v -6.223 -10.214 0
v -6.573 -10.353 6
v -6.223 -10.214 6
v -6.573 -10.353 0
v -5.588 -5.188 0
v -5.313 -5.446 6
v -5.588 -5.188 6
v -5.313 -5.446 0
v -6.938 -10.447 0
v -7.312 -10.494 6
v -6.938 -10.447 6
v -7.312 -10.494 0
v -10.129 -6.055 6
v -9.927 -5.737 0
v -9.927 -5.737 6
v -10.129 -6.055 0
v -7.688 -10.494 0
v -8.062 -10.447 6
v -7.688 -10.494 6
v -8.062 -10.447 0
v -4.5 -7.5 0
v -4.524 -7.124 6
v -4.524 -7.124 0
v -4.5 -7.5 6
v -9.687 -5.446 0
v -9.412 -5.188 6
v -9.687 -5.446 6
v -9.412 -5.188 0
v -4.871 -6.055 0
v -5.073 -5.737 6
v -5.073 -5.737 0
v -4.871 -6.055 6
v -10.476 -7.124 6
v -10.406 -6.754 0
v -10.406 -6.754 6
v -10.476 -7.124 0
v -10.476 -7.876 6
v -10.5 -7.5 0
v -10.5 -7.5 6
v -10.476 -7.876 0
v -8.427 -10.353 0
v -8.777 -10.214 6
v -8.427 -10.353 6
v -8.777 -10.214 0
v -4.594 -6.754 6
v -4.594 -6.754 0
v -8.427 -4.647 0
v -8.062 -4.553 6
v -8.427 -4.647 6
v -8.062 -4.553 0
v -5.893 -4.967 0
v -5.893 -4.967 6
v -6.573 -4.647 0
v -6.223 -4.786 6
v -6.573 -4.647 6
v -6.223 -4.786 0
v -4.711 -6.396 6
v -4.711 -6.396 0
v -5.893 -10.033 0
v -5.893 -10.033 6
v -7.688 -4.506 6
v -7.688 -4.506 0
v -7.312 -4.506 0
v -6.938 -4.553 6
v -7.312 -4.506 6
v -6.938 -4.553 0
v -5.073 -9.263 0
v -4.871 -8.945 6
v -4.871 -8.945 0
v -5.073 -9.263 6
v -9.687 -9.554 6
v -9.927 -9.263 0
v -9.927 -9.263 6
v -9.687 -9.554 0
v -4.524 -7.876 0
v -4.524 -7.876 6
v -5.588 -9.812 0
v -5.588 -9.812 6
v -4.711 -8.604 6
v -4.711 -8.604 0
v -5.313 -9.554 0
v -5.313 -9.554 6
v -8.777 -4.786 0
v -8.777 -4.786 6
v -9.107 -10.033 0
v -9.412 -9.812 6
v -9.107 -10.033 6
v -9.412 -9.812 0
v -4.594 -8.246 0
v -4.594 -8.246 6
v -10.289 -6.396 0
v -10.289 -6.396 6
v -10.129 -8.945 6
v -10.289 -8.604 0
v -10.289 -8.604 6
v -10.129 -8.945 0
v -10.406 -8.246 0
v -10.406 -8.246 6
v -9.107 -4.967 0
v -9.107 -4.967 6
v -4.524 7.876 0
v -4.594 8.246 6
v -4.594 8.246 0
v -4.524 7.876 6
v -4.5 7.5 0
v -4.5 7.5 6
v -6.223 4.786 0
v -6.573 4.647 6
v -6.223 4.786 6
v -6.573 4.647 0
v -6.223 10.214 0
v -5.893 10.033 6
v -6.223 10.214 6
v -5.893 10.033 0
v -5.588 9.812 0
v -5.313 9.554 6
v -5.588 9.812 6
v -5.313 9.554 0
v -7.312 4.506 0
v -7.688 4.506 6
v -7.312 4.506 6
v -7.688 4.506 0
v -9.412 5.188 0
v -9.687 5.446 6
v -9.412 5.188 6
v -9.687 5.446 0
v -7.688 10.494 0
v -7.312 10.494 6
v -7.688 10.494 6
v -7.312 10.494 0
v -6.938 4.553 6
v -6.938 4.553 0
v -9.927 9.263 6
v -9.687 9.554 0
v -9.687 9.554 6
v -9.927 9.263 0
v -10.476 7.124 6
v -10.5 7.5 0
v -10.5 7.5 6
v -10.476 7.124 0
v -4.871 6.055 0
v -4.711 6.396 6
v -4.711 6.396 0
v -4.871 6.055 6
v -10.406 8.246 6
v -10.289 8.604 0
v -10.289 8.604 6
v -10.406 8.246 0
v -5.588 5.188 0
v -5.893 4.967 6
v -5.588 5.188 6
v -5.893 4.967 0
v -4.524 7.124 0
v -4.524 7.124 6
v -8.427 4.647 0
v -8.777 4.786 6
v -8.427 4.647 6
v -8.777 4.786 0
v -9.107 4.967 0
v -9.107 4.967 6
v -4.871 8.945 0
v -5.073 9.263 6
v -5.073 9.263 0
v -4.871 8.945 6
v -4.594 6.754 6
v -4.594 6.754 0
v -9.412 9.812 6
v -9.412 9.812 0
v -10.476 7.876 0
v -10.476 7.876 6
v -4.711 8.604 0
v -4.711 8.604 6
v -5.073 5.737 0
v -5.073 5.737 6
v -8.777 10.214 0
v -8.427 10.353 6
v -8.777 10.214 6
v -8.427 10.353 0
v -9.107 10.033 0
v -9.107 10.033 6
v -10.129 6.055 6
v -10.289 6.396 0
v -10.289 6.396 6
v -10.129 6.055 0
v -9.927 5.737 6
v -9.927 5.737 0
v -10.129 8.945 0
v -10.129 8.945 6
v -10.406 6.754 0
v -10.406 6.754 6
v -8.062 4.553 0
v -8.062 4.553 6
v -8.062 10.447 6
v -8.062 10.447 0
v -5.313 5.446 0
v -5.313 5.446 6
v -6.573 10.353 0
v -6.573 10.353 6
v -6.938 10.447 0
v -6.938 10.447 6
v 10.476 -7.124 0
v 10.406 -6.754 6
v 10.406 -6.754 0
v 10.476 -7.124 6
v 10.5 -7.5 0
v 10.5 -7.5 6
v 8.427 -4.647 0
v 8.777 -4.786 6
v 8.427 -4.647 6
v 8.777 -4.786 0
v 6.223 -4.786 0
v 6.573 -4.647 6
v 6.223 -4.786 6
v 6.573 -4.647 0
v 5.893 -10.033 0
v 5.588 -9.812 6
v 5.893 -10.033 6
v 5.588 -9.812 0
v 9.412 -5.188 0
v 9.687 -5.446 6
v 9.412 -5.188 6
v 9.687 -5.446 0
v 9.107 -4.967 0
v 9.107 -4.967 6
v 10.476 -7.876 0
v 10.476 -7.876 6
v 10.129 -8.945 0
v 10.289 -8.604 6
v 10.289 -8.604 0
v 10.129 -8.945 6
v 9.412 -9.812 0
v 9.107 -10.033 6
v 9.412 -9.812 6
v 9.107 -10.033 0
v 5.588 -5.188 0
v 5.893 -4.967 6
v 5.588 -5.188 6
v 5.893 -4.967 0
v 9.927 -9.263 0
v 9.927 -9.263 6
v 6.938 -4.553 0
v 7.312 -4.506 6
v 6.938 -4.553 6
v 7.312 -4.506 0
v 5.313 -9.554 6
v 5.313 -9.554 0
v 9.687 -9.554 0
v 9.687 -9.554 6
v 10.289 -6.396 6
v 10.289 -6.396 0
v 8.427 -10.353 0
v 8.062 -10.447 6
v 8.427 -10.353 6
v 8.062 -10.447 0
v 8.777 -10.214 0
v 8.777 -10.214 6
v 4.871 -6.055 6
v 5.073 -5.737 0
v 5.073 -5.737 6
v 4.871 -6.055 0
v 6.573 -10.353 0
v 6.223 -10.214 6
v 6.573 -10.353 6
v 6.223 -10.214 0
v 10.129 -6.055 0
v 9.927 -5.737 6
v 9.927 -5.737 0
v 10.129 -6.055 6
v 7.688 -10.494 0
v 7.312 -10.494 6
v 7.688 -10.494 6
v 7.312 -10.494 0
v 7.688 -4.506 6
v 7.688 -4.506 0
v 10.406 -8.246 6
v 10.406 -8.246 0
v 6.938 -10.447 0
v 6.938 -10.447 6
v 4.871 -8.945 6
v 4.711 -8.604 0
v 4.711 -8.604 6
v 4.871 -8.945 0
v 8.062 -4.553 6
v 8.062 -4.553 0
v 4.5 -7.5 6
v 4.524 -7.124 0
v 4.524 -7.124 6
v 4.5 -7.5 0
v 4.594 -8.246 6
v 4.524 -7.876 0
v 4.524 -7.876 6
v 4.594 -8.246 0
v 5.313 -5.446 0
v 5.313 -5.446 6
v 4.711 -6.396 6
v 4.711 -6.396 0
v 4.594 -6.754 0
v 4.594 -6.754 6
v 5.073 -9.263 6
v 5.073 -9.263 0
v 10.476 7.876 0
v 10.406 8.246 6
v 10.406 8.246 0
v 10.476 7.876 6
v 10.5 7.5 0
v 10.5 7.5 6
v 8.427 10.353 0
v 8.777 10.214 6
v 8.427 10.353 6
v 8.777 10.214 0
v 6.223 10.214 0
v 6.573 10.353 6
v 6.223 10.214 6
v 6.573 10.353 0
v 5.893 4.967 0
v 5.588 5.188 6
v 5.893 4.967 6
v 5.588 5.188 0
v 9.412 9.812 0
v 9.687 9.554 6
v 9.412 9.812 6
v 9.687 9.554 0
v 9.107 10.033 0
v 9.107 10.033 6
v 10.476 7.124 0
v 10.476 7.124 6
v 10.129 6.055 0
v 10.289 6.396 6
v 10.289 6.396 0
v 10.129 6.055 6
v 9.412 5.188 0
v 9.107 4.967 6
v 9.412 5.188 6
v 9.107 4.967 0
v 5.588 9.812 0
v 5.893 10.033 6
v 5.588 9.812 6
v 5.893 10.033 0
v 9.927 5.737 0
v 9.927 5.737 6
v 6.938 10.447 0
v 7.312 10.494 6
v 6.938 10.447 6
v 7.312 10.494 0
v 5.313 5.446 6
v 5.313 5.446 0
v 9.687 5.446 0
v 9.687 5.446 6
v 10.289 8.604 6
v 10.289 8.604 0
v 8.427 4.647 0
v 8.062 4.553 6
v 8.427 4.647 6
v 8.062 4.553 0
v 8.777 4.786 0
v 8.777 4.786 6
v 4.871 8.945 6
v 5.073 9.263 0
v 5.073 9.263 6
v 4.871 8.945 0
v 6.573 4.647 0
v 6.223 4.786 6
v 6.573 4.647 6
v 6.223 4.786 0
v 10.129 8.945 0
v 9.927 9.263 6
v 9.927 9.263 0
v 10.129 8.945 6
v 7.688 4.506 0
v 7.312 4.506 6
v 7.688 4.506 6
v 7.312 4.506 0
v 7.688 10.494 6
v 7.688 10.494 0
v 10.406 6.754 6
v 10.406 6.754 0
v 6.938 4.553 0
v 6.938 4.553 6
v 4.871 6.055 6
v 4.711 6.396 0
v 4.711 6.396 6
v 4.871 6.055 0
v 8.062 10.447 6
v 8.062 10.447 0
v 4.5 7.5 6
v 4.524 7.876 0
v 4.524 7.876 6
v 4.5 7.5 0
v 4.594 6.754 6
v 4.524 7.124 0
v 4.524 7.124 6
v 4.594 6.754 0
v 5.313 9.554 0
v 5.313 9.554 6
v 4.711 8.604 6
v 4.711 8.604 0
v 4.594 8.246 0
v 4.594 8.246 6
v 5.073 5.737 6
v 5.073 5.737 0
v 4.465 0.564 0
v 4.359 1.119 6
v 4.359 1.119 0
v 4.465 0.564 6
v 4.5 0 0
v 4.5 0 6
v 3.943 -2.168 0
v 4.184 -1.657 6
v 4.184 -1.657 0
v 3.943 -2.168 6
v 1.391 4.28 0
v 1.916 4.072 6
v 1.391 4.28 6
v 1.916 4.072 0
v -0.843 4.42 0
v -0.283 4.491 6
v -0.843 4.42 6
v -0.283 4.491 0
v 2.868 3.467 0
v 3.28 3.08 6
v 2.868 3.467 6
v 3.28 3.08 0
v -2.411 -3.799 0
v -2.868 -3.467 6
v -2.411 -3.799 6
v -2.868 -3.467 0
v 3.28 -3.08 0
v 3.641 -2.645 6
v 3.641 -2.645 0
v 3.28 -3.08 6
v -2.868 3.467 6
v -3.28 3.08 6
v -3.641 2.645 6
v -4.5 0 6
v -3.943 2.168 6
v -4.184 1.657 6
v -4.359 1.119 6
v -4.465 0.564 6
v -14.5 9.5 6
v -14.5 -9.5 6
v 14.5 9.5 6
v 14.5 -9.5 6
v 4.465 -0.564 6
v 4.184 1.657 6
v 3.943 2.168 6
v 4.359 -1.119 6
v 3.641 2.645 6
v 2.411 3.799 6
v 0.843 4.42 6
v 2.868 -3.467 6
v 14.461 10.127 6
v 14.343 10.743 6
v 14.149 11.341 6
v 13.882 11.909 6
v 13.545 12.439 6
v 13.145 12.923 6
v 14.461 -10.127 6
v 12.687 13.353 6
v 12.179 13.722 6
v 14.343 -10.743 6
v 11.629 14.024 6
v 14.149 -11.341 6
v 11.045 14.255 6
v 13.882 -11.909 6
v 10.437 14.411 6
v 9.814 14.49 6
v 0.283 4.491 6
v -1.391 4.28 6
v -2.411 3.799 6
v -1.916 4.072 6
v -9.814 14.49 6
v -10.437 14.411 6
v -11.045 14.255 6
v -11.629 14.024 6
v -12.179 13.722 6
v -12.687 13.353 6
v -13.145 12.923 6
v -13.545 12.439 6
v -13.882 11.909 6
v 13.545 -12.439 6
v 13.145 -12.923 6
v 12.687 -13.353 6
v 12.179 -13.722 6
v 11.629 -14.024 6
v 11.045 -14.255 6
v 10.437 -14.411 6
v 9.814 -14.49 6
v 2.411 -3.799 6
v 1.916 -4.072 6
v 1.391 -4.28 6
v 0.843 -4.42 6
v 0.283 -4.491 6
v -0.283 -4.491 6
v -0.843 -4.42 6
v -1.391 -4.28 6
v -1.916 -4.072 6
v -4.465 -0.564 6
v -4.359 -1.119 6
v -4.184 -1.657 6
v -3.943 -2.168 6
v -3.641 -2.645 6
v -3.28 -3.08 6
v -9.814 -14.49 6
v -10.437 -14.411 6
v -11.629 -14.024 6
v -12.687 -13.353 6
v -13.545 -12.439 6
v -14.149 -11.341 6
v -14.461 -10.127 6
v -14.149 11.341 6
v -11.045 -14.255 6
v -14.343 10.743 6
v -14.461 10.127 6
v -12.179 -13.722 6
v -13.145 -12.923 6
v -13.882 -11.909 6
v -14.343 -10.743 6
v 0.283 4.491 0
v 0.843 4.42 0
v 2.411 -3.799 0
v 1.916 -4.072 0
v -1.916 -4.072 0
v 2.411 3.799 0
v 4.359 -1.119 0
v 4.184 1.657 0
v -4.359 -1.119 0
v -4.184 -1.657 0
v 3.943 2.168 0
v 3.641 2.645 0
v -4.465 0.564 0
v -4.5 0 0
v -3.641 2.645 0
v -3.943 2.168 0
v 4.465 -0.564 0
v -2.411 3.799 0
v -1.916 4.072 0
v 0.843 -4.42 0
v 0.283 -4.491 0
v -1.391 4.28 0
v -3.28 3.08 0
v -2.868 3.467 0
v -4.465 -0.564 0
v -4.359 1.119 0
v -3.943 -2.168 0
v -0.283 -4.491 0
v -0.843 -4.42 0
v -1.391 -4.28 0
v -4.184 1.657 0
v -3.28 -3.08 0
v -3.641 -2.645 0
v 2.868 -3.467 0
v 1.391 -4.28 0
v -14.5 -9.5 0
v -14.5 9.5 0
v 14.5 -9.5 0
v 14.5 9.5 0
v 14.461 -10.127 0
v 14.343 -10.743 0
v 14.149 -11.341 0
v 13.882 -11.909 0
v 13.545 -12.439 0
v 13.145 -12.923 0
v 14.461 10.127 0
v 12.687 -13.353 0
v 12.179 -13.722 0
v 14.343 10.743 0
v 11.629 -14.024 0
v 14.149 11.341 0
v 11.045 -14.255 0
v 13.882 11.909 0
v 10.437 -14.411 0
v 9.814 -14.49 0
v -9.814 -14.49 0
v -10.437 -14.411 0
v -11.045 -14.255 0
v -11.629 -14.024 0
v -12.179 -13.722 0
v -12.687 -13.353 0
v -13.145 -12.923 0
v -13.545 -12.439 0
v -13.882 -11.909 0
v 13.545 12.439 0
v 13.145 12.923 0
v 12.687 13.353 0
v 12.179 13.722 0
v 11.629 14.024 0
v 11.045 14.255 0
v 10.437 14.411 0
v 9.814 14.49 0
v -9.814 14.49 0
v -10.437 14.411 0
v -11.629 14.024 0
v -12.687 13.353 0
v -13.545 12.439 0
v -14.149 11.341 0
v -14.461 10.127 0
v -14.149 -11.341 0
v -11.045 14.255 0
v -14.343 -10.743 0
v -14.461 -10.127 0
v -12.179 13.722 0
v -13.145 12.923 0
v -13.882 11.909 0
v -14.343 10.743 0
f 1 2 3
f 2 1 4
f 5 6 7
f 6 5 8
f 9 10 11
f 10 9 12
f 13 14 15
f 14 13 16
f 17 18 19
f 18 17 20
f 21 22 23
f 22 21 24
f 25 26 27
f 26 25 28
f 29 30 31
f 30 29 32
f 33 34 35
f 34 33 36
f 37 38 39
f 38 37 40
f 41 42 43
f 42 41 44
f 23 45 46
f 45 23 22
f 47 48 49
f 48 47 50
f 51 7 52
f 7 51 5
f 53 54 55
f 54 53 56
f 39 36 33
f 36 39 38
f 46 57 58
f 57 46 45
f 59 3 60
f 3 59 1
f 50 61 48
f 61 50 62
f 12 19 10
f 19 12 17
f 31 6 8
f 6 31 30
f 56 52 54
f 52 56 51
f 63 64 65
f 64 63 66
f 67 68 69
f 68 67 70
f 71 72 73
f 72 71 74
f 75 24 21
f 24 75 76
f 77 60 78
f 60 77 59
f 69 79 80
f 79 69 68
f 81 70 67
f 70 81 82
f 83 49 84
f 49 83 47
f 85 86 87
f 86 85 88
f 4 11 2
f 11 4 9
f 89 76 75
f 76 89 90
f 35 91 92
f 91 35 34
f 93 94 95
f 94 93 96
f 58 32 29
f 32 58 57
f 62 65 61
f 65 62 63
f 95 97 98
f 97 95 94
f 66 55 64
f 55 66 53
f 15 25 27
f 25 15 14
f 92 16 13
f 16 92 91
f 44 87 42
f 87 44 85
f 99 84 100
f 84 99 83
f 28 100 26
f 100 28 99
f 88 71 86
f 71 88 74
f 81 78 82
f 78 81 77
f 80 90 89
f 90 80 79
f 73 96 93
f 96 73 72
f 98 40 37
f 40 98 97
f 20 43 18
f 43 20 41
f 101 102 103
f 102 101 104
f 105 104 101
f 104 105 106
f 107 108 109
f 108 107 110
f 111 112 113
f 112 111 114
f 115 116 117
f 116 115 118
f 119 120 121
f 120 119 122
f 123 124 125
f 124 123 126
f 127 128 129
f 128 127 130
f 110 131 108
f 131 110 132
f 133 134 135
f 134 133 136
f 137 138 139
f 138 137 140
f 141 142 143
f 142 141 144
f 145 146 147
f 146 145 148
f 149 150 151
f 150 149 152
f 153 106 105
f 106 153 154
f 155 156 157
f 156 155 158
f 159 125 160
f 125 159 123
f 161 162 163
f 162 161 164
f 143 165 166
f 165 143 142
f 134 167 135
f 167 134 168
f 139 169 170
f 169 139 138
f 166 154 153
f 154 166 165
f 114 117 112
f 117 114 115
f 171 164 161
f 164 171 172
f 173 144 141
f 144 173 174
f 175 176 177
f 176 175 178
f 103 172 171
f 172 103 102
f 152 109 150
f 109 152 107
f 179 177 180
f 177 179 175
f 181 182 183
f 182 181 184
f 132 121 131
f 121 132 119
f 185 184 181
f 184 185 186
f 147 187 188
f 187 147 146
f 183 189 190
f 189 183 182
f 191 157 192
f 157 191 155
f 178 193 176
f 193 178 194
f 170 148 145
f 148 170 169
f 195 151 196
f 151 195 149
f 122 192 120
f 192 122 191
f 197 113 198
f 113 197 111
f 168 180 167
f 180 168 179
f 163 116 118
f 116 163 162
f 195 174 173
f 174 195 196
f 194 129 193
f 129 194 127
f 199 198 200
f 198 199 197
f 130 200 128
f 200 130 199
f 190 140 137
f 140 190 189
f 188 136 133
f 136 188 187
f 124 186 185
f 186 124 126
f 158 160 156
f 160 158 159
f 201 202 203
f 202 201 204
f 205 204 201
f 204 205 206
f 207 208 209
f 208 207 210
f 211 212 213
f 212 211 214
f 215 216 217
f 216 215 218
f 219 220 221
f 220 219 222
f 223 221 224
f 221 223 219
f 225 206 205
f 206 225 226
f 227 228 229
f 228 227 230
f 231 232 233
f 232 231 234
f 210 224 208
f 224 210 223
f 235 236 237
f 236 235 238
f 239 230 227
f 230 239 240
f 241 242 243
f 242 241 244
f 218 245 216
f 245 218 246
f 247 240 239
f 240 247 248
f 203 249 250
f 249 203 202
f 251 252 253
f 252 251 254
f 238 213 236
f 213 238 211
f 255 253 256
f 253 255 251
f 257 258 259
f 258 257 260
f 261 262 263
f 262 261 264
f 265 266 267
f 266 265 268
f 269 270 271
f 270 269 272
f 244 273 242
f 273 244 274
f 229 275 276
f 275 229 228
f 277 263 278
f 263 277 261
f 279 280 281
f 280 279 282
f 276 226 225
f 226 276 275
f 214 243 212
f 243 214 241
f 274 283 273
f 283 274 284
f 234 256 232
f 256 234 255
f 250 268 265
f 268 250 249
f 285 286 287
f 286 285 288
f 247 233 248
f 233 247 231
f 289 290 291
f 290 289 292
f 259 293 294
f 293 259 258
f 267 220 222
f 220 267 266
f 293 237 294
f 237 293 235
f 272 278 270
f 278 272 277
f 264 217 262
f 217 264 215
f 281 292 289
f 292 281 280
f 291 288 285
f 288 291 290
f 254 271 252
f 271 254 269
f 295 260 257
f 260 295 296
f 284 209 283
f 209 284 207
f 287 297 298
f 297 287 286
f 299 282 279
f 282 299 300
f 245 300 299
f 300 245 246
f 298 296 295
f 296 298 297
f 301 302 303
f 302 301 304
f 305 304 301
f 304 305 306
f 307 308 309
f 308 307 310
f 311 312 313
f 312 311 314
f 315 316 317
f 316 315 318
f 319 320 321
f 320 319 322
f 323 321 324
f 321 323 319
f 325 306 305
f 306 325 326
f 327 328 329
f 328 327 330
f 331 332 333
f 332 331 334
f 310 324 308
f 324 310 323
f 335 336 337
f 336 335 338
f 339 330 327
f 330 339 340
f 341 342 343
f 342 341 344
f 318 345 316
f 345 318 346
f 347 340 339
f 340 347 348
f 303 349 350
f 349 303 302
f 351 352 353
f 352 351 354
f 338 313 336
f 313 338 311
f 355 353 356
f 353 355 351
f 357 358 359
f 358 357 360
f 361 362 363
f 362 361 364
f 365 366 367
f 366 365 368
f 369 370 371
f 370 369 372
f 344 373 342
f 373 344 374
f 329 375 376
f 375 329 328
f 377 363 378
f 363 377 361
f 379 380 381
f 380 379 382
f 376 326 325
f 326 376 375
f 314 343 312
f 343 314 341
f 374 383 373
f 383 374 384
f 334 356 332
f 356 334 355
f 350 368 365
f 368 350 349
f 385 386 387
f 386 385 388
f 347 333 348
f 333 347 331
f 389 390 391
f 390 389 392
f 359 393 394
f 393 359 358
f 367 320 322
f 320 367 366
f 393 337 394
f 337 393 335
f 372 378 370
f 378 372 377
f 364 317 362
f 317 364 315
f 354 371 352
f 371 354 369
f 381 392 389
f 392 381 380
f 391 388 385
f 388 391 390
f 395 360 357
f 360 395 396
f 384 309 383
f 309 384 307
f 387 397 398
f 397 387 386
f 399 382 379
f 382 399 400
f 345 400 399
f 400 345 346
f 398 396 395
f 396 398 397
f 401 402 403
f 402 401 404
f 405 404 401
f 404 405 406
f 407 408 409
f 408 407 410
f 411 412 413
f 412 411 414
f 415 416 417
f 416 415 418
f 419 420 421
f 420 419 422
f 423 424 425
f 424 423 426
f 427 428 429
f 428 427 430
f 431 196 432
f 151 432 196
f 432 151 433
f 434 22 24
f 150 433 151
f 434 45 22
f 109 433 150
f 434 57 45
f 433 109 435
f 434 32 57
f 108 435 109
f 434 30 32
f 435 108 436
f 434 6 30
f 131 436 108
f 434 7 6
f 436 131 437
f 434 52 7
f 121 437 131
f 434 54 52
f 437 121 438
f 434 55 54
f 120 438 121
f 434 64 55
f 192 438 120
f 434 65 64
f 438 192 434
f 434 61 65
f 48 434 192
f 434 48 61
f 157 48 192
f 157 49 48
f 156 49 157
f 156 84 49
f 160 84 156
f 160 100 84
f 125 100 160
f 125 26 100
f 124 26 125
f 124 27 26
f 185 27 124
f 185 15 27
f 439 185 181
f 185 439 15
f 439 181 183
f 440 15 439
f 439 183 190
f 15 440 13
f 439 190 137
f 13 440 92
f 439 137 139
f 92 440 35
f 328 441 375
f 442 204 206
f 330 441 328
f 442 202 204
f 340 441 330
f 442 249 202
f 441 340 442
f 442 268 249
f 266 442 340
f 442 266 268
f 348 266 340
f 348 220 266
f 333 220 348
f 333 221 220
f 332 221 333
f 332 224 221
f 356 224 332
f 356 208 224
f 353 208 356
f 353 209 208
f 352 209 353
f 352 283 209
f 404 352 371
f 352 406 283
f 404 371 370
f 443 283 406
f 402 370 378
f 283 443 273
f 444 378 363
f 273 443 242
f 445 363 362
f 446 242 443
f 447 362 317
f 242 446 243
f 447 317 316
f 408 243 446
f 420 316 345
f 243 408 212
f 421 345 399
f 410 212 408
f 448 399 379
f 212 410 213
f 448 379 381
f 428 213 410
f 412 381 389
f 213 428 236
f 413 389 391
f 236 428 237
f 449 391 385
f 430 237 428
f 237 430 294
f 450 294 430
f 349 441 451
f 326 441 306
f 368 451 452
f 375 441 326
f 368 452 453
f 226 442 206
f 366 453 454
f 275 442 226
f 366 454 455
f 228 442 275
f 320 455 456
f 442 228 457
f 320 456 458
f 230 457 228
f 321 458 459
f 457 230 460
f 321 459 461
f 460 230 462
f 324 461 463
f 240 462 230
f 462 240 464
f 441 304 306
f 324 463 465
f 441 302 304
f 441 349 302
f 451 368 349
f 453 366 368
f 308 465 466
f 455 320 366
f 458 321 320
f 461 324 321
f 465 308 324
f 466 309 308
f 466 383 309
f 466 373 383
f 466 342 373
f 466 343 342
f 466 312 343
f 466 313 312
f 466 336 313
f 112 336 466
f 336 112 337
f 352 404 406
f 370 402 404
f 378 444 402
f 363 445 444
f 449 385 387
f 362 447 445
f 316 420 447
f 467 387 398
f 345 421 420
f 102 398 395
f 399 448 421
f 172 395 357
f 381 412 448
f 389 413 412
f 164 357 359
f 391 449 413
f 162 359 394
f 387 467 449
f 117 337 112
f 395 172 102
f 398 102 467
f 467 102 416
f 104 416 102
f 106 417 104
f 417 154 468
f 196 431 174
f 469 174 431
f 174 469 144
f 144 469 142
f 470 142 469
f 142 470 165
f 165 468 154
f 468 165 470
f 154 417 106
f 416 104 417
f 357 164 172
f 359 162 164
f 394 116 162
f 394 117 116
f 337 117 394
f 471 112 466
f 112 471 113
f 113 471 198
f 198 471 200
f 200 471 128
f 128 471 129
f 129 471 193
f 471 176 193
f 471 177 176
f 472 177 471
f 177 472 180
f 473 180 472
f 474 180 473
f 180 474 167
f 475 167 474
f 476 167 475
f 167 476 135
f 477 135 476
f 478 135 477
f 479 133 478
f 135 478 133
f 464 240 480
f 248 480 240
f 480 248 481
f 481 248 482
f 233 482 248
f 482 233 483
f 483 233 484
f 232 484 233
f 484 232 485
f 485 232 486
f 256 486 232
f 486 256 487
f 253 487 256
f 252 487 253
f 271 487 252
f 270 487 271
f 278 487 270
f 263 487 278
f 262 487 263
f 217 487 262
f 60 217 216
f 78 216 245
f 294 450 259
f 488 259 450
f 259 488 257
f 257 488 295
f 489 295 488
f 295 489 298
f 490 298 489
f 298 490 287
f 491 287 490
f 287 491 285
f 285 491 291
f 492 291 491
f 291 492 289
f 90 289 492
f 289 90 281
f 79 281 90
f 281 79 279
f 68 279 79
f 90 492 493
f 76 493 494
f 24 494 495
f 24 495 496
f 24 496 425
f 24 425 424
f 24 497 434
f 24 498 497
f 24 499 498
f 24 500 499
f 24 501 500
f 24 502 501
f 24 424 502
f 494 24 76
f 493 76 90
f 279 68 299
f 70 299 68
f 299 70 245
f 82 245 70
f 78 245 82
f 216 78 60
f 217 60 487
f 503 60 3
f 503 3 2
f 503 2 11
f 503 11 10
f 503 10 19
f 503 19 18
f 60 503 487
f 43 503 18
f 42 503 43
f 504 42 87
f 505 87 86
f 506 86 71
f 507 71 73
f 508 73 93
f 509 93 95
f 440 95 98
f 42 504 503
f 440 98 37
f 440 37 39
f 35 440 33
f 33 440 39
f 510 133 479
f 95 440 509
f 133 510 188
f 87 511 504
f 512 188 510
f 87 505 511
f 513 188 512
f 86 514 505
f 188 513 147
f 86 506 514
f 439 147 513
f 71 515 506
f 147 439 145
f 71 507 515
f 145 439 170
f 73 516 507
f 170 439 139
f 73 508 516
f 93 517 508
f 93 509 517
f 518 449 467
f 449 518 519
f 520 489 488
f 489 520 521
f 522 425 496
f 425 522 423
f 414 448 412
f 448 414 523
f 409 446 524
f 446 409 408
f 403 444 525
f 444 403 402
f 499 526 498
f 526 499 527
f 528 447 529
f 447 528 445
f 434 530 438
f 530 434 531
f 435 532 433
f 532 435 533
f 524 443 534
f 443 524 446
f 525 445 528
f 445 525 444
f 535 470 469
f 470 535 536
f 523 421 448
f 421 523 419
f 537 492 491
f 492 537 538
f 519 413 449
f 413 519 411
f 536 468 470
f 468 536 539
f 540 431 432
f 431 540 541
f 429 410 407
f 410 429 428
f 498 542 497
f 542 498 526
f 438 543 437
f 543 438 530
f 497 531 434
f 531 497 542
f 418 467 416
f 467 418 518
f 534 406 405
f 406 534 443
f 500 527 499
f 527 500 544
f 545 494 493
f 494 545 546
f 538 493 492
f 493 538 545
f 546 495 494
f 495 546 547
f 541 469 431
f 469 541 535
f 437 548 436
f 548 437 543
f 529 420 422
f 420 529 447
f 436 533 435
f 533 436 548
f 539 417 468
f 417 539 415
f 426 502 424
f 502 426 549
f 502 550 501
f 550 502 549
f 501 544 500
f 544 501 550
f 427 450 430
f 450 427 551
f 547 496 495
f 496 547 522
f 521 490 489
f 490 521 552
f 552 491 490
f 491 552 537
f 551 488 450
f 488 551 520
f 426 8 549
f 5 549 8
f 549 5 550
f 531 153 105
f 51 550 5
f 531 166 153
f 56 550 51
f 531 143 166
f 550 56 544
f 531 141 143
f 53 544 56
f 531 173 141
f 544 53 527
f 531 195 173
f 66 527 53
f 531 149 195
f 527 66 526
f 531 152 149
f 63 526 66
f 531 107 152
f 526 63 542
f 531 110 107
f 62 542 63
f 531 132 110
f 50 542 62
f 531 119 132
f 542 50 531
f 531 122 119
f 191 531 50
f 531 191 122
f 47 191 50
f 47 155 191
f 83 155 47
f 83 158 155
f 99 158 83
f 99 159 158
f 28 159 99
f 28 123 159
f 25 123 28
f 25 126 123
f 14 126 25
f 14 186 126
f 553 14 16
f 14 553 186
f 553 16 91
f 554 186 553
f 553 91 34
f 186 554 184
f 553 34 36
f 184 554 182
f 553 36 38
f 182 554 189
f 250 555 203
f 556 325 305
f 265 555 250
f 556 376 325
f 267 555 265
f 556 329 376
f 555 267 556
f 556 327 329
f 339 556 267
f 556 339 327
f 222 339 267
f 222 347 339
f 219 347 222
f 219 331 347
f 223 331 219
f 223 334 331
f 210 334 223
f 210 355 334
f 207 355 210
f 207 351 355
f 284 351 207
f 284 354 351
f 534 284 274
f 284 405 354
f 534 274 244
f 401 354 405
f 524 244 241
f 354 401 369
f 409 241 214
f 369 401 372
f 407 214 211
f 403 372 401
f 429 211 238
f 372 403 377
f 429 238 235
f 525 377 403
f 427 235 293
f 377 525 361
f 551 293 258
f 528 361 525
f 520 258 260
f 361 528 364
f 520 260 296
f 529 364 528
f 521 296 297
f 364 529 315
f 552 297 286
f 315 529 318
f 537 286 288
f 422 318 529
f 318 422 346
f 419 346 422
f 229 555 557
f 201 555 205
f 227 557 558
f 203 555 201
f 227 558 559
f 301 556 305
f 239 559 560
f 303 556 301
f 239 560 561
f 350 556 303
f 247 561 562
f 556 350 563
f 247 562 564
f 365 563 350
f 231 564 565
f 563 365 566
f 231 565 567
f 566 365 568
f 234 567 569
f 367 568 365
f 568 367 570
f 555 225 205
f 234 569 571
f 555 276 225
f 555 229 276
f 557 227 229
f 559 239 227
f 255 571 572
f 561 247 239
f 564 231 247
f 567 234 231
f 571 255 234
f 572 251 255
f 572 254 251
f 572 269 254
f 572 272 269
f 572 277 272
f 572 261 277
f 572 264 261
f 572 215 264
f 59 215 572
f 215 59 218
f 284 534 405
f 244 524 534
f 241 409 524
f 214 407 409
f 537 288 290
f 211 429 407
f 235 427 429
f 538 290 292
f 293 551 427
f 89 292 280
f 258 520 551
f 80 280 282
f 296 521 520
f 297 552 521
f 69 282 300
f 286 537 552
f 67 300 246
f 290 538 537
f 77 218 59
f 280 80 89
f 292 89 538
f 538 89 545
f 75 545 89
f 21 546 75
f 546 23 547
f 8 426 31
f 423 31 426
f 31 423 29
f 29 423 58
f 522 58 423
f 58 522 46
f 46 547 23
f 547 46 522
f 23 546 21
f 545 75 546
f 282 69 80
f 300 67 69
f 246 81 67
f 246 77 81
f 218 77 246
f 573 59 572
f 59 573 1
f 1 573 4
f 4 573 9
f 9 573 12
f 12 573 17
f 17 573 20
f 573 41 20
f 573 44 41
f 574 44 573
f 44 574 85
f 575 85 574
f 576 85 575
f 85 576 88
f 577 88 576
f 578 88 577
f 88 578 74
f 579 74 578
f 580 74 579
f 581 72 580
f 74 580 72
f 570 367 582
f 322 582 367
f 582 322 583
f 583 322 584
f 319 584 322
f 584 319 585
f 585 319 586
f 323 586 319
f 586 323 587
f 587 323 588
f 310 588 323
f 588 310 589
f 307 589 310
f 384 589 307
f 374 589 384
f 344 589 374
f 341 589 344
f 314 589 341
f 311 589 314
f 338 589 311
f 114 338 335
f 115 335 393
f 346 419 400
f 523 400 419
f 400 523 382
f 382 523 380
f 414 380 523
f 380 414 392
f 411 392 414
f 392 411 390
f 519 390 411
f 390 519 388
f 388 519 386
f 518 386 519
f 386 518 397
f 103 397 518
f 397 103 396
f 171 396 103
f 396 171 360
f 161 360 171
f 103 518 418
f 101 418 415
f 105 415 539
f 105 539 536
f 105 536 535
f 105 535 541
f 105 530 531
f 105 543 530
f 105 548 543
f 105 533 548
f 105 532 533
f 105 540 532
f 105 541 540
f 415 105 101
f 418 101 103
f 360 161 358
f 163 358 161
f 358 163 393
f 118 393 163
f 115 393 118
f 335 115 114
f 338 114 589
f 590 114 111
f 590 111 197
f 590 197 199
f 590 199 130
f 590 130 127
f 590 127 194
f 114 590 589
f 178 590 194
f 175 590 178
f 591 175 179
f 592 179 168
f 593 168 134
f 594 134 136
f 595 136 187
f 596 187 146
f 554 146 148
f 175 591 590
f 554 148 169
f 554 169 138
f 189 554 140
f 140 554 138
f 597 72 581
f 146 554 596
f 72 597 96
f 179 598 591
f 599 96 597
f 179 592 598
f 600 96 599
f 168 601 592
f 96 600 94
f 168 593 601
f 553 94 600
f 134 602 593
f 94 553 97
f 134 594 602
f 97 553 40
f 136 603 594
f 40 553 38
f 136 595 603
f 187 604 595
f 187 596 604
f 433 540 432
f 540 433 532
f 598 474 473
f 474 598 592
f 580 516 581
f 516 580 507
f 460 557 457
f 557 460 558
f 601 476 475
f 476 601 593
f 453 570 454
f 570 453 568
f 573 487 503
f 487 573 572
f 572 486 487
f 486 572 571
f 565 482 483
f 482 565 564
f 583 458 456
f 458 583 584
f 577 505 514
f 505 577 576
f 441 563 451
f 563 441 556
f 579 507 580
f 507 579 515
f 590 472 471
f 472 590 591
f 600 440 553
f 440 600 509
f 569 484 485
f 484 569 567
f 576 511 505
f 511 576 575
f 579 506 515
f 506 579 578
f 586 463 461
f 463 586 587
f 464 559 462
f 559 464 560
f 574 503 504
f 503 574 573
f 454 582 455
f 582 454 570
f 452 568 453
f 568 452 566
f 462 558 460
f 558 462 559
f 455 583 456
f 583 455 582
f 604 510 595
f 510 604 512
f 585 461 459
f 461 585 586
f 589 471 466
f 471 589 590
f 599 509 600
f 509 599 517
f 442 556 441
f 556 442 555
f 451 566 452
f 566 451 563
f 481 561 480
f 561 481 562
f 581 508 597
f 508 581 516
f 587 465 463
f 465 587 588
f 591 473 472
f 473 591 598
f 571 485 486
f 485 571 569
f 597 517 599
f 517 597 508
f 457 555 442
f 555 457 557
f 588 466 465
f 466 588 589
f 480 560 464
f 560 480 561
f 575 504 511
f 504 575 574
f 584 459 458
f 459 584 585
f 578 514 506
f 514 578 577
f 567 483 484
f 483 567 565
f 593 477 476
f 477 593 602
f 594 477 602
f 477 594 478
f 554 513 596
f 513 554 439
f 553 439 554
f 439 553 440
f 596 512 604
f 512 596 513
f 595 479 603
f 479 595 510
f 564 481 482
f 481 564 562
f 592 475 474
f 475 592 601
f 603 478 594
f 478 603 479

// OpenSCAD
$fn = 50;


difference() {
	union() {
		hull() {
			translate(v = [-9.5000000000, 9.5000000000, 0]) {
				cylinder(h = 6, r = 5);
			}
			translate(v = [9.5000000000, 9.5000000000, 0]) {
				cylinder(h = 6, r = 5);
			}
			translate(v = [-9.5000000000, -9.5000000000, 0]) {
				cylinder(h = 6, r = 5);
			}
			translate(v = [9.5000000000, -9.5000000000, 0]) {
				cylinder(h = 6, r = 5);
			}
		}
	}
	union() {
		#translate(v = [-7.5000000000, -7.5000000000, -100.0000000000]) {
			cylinder(h = 200, r = 3.0000000000);
		}
		#translate(v = [-7.5000000000, 7.5000000000, -100.0000000000]) {
			cylinder(h = 200, r = 3.0000000000);
		}
		#translate(v = [7.5000000000, -7.5000000000, -100.0000000000]) {
			cylinder(h = 200, r = 3.0000000000);
		}
		#translate(v = [7.5000000000, 7.5000000000, -100.0000000000]) {
			cylinder(h = 200, r = 3.0000000000);
		}
		#cylinder(h = 6, r = 4.5000000000);
	}
}
